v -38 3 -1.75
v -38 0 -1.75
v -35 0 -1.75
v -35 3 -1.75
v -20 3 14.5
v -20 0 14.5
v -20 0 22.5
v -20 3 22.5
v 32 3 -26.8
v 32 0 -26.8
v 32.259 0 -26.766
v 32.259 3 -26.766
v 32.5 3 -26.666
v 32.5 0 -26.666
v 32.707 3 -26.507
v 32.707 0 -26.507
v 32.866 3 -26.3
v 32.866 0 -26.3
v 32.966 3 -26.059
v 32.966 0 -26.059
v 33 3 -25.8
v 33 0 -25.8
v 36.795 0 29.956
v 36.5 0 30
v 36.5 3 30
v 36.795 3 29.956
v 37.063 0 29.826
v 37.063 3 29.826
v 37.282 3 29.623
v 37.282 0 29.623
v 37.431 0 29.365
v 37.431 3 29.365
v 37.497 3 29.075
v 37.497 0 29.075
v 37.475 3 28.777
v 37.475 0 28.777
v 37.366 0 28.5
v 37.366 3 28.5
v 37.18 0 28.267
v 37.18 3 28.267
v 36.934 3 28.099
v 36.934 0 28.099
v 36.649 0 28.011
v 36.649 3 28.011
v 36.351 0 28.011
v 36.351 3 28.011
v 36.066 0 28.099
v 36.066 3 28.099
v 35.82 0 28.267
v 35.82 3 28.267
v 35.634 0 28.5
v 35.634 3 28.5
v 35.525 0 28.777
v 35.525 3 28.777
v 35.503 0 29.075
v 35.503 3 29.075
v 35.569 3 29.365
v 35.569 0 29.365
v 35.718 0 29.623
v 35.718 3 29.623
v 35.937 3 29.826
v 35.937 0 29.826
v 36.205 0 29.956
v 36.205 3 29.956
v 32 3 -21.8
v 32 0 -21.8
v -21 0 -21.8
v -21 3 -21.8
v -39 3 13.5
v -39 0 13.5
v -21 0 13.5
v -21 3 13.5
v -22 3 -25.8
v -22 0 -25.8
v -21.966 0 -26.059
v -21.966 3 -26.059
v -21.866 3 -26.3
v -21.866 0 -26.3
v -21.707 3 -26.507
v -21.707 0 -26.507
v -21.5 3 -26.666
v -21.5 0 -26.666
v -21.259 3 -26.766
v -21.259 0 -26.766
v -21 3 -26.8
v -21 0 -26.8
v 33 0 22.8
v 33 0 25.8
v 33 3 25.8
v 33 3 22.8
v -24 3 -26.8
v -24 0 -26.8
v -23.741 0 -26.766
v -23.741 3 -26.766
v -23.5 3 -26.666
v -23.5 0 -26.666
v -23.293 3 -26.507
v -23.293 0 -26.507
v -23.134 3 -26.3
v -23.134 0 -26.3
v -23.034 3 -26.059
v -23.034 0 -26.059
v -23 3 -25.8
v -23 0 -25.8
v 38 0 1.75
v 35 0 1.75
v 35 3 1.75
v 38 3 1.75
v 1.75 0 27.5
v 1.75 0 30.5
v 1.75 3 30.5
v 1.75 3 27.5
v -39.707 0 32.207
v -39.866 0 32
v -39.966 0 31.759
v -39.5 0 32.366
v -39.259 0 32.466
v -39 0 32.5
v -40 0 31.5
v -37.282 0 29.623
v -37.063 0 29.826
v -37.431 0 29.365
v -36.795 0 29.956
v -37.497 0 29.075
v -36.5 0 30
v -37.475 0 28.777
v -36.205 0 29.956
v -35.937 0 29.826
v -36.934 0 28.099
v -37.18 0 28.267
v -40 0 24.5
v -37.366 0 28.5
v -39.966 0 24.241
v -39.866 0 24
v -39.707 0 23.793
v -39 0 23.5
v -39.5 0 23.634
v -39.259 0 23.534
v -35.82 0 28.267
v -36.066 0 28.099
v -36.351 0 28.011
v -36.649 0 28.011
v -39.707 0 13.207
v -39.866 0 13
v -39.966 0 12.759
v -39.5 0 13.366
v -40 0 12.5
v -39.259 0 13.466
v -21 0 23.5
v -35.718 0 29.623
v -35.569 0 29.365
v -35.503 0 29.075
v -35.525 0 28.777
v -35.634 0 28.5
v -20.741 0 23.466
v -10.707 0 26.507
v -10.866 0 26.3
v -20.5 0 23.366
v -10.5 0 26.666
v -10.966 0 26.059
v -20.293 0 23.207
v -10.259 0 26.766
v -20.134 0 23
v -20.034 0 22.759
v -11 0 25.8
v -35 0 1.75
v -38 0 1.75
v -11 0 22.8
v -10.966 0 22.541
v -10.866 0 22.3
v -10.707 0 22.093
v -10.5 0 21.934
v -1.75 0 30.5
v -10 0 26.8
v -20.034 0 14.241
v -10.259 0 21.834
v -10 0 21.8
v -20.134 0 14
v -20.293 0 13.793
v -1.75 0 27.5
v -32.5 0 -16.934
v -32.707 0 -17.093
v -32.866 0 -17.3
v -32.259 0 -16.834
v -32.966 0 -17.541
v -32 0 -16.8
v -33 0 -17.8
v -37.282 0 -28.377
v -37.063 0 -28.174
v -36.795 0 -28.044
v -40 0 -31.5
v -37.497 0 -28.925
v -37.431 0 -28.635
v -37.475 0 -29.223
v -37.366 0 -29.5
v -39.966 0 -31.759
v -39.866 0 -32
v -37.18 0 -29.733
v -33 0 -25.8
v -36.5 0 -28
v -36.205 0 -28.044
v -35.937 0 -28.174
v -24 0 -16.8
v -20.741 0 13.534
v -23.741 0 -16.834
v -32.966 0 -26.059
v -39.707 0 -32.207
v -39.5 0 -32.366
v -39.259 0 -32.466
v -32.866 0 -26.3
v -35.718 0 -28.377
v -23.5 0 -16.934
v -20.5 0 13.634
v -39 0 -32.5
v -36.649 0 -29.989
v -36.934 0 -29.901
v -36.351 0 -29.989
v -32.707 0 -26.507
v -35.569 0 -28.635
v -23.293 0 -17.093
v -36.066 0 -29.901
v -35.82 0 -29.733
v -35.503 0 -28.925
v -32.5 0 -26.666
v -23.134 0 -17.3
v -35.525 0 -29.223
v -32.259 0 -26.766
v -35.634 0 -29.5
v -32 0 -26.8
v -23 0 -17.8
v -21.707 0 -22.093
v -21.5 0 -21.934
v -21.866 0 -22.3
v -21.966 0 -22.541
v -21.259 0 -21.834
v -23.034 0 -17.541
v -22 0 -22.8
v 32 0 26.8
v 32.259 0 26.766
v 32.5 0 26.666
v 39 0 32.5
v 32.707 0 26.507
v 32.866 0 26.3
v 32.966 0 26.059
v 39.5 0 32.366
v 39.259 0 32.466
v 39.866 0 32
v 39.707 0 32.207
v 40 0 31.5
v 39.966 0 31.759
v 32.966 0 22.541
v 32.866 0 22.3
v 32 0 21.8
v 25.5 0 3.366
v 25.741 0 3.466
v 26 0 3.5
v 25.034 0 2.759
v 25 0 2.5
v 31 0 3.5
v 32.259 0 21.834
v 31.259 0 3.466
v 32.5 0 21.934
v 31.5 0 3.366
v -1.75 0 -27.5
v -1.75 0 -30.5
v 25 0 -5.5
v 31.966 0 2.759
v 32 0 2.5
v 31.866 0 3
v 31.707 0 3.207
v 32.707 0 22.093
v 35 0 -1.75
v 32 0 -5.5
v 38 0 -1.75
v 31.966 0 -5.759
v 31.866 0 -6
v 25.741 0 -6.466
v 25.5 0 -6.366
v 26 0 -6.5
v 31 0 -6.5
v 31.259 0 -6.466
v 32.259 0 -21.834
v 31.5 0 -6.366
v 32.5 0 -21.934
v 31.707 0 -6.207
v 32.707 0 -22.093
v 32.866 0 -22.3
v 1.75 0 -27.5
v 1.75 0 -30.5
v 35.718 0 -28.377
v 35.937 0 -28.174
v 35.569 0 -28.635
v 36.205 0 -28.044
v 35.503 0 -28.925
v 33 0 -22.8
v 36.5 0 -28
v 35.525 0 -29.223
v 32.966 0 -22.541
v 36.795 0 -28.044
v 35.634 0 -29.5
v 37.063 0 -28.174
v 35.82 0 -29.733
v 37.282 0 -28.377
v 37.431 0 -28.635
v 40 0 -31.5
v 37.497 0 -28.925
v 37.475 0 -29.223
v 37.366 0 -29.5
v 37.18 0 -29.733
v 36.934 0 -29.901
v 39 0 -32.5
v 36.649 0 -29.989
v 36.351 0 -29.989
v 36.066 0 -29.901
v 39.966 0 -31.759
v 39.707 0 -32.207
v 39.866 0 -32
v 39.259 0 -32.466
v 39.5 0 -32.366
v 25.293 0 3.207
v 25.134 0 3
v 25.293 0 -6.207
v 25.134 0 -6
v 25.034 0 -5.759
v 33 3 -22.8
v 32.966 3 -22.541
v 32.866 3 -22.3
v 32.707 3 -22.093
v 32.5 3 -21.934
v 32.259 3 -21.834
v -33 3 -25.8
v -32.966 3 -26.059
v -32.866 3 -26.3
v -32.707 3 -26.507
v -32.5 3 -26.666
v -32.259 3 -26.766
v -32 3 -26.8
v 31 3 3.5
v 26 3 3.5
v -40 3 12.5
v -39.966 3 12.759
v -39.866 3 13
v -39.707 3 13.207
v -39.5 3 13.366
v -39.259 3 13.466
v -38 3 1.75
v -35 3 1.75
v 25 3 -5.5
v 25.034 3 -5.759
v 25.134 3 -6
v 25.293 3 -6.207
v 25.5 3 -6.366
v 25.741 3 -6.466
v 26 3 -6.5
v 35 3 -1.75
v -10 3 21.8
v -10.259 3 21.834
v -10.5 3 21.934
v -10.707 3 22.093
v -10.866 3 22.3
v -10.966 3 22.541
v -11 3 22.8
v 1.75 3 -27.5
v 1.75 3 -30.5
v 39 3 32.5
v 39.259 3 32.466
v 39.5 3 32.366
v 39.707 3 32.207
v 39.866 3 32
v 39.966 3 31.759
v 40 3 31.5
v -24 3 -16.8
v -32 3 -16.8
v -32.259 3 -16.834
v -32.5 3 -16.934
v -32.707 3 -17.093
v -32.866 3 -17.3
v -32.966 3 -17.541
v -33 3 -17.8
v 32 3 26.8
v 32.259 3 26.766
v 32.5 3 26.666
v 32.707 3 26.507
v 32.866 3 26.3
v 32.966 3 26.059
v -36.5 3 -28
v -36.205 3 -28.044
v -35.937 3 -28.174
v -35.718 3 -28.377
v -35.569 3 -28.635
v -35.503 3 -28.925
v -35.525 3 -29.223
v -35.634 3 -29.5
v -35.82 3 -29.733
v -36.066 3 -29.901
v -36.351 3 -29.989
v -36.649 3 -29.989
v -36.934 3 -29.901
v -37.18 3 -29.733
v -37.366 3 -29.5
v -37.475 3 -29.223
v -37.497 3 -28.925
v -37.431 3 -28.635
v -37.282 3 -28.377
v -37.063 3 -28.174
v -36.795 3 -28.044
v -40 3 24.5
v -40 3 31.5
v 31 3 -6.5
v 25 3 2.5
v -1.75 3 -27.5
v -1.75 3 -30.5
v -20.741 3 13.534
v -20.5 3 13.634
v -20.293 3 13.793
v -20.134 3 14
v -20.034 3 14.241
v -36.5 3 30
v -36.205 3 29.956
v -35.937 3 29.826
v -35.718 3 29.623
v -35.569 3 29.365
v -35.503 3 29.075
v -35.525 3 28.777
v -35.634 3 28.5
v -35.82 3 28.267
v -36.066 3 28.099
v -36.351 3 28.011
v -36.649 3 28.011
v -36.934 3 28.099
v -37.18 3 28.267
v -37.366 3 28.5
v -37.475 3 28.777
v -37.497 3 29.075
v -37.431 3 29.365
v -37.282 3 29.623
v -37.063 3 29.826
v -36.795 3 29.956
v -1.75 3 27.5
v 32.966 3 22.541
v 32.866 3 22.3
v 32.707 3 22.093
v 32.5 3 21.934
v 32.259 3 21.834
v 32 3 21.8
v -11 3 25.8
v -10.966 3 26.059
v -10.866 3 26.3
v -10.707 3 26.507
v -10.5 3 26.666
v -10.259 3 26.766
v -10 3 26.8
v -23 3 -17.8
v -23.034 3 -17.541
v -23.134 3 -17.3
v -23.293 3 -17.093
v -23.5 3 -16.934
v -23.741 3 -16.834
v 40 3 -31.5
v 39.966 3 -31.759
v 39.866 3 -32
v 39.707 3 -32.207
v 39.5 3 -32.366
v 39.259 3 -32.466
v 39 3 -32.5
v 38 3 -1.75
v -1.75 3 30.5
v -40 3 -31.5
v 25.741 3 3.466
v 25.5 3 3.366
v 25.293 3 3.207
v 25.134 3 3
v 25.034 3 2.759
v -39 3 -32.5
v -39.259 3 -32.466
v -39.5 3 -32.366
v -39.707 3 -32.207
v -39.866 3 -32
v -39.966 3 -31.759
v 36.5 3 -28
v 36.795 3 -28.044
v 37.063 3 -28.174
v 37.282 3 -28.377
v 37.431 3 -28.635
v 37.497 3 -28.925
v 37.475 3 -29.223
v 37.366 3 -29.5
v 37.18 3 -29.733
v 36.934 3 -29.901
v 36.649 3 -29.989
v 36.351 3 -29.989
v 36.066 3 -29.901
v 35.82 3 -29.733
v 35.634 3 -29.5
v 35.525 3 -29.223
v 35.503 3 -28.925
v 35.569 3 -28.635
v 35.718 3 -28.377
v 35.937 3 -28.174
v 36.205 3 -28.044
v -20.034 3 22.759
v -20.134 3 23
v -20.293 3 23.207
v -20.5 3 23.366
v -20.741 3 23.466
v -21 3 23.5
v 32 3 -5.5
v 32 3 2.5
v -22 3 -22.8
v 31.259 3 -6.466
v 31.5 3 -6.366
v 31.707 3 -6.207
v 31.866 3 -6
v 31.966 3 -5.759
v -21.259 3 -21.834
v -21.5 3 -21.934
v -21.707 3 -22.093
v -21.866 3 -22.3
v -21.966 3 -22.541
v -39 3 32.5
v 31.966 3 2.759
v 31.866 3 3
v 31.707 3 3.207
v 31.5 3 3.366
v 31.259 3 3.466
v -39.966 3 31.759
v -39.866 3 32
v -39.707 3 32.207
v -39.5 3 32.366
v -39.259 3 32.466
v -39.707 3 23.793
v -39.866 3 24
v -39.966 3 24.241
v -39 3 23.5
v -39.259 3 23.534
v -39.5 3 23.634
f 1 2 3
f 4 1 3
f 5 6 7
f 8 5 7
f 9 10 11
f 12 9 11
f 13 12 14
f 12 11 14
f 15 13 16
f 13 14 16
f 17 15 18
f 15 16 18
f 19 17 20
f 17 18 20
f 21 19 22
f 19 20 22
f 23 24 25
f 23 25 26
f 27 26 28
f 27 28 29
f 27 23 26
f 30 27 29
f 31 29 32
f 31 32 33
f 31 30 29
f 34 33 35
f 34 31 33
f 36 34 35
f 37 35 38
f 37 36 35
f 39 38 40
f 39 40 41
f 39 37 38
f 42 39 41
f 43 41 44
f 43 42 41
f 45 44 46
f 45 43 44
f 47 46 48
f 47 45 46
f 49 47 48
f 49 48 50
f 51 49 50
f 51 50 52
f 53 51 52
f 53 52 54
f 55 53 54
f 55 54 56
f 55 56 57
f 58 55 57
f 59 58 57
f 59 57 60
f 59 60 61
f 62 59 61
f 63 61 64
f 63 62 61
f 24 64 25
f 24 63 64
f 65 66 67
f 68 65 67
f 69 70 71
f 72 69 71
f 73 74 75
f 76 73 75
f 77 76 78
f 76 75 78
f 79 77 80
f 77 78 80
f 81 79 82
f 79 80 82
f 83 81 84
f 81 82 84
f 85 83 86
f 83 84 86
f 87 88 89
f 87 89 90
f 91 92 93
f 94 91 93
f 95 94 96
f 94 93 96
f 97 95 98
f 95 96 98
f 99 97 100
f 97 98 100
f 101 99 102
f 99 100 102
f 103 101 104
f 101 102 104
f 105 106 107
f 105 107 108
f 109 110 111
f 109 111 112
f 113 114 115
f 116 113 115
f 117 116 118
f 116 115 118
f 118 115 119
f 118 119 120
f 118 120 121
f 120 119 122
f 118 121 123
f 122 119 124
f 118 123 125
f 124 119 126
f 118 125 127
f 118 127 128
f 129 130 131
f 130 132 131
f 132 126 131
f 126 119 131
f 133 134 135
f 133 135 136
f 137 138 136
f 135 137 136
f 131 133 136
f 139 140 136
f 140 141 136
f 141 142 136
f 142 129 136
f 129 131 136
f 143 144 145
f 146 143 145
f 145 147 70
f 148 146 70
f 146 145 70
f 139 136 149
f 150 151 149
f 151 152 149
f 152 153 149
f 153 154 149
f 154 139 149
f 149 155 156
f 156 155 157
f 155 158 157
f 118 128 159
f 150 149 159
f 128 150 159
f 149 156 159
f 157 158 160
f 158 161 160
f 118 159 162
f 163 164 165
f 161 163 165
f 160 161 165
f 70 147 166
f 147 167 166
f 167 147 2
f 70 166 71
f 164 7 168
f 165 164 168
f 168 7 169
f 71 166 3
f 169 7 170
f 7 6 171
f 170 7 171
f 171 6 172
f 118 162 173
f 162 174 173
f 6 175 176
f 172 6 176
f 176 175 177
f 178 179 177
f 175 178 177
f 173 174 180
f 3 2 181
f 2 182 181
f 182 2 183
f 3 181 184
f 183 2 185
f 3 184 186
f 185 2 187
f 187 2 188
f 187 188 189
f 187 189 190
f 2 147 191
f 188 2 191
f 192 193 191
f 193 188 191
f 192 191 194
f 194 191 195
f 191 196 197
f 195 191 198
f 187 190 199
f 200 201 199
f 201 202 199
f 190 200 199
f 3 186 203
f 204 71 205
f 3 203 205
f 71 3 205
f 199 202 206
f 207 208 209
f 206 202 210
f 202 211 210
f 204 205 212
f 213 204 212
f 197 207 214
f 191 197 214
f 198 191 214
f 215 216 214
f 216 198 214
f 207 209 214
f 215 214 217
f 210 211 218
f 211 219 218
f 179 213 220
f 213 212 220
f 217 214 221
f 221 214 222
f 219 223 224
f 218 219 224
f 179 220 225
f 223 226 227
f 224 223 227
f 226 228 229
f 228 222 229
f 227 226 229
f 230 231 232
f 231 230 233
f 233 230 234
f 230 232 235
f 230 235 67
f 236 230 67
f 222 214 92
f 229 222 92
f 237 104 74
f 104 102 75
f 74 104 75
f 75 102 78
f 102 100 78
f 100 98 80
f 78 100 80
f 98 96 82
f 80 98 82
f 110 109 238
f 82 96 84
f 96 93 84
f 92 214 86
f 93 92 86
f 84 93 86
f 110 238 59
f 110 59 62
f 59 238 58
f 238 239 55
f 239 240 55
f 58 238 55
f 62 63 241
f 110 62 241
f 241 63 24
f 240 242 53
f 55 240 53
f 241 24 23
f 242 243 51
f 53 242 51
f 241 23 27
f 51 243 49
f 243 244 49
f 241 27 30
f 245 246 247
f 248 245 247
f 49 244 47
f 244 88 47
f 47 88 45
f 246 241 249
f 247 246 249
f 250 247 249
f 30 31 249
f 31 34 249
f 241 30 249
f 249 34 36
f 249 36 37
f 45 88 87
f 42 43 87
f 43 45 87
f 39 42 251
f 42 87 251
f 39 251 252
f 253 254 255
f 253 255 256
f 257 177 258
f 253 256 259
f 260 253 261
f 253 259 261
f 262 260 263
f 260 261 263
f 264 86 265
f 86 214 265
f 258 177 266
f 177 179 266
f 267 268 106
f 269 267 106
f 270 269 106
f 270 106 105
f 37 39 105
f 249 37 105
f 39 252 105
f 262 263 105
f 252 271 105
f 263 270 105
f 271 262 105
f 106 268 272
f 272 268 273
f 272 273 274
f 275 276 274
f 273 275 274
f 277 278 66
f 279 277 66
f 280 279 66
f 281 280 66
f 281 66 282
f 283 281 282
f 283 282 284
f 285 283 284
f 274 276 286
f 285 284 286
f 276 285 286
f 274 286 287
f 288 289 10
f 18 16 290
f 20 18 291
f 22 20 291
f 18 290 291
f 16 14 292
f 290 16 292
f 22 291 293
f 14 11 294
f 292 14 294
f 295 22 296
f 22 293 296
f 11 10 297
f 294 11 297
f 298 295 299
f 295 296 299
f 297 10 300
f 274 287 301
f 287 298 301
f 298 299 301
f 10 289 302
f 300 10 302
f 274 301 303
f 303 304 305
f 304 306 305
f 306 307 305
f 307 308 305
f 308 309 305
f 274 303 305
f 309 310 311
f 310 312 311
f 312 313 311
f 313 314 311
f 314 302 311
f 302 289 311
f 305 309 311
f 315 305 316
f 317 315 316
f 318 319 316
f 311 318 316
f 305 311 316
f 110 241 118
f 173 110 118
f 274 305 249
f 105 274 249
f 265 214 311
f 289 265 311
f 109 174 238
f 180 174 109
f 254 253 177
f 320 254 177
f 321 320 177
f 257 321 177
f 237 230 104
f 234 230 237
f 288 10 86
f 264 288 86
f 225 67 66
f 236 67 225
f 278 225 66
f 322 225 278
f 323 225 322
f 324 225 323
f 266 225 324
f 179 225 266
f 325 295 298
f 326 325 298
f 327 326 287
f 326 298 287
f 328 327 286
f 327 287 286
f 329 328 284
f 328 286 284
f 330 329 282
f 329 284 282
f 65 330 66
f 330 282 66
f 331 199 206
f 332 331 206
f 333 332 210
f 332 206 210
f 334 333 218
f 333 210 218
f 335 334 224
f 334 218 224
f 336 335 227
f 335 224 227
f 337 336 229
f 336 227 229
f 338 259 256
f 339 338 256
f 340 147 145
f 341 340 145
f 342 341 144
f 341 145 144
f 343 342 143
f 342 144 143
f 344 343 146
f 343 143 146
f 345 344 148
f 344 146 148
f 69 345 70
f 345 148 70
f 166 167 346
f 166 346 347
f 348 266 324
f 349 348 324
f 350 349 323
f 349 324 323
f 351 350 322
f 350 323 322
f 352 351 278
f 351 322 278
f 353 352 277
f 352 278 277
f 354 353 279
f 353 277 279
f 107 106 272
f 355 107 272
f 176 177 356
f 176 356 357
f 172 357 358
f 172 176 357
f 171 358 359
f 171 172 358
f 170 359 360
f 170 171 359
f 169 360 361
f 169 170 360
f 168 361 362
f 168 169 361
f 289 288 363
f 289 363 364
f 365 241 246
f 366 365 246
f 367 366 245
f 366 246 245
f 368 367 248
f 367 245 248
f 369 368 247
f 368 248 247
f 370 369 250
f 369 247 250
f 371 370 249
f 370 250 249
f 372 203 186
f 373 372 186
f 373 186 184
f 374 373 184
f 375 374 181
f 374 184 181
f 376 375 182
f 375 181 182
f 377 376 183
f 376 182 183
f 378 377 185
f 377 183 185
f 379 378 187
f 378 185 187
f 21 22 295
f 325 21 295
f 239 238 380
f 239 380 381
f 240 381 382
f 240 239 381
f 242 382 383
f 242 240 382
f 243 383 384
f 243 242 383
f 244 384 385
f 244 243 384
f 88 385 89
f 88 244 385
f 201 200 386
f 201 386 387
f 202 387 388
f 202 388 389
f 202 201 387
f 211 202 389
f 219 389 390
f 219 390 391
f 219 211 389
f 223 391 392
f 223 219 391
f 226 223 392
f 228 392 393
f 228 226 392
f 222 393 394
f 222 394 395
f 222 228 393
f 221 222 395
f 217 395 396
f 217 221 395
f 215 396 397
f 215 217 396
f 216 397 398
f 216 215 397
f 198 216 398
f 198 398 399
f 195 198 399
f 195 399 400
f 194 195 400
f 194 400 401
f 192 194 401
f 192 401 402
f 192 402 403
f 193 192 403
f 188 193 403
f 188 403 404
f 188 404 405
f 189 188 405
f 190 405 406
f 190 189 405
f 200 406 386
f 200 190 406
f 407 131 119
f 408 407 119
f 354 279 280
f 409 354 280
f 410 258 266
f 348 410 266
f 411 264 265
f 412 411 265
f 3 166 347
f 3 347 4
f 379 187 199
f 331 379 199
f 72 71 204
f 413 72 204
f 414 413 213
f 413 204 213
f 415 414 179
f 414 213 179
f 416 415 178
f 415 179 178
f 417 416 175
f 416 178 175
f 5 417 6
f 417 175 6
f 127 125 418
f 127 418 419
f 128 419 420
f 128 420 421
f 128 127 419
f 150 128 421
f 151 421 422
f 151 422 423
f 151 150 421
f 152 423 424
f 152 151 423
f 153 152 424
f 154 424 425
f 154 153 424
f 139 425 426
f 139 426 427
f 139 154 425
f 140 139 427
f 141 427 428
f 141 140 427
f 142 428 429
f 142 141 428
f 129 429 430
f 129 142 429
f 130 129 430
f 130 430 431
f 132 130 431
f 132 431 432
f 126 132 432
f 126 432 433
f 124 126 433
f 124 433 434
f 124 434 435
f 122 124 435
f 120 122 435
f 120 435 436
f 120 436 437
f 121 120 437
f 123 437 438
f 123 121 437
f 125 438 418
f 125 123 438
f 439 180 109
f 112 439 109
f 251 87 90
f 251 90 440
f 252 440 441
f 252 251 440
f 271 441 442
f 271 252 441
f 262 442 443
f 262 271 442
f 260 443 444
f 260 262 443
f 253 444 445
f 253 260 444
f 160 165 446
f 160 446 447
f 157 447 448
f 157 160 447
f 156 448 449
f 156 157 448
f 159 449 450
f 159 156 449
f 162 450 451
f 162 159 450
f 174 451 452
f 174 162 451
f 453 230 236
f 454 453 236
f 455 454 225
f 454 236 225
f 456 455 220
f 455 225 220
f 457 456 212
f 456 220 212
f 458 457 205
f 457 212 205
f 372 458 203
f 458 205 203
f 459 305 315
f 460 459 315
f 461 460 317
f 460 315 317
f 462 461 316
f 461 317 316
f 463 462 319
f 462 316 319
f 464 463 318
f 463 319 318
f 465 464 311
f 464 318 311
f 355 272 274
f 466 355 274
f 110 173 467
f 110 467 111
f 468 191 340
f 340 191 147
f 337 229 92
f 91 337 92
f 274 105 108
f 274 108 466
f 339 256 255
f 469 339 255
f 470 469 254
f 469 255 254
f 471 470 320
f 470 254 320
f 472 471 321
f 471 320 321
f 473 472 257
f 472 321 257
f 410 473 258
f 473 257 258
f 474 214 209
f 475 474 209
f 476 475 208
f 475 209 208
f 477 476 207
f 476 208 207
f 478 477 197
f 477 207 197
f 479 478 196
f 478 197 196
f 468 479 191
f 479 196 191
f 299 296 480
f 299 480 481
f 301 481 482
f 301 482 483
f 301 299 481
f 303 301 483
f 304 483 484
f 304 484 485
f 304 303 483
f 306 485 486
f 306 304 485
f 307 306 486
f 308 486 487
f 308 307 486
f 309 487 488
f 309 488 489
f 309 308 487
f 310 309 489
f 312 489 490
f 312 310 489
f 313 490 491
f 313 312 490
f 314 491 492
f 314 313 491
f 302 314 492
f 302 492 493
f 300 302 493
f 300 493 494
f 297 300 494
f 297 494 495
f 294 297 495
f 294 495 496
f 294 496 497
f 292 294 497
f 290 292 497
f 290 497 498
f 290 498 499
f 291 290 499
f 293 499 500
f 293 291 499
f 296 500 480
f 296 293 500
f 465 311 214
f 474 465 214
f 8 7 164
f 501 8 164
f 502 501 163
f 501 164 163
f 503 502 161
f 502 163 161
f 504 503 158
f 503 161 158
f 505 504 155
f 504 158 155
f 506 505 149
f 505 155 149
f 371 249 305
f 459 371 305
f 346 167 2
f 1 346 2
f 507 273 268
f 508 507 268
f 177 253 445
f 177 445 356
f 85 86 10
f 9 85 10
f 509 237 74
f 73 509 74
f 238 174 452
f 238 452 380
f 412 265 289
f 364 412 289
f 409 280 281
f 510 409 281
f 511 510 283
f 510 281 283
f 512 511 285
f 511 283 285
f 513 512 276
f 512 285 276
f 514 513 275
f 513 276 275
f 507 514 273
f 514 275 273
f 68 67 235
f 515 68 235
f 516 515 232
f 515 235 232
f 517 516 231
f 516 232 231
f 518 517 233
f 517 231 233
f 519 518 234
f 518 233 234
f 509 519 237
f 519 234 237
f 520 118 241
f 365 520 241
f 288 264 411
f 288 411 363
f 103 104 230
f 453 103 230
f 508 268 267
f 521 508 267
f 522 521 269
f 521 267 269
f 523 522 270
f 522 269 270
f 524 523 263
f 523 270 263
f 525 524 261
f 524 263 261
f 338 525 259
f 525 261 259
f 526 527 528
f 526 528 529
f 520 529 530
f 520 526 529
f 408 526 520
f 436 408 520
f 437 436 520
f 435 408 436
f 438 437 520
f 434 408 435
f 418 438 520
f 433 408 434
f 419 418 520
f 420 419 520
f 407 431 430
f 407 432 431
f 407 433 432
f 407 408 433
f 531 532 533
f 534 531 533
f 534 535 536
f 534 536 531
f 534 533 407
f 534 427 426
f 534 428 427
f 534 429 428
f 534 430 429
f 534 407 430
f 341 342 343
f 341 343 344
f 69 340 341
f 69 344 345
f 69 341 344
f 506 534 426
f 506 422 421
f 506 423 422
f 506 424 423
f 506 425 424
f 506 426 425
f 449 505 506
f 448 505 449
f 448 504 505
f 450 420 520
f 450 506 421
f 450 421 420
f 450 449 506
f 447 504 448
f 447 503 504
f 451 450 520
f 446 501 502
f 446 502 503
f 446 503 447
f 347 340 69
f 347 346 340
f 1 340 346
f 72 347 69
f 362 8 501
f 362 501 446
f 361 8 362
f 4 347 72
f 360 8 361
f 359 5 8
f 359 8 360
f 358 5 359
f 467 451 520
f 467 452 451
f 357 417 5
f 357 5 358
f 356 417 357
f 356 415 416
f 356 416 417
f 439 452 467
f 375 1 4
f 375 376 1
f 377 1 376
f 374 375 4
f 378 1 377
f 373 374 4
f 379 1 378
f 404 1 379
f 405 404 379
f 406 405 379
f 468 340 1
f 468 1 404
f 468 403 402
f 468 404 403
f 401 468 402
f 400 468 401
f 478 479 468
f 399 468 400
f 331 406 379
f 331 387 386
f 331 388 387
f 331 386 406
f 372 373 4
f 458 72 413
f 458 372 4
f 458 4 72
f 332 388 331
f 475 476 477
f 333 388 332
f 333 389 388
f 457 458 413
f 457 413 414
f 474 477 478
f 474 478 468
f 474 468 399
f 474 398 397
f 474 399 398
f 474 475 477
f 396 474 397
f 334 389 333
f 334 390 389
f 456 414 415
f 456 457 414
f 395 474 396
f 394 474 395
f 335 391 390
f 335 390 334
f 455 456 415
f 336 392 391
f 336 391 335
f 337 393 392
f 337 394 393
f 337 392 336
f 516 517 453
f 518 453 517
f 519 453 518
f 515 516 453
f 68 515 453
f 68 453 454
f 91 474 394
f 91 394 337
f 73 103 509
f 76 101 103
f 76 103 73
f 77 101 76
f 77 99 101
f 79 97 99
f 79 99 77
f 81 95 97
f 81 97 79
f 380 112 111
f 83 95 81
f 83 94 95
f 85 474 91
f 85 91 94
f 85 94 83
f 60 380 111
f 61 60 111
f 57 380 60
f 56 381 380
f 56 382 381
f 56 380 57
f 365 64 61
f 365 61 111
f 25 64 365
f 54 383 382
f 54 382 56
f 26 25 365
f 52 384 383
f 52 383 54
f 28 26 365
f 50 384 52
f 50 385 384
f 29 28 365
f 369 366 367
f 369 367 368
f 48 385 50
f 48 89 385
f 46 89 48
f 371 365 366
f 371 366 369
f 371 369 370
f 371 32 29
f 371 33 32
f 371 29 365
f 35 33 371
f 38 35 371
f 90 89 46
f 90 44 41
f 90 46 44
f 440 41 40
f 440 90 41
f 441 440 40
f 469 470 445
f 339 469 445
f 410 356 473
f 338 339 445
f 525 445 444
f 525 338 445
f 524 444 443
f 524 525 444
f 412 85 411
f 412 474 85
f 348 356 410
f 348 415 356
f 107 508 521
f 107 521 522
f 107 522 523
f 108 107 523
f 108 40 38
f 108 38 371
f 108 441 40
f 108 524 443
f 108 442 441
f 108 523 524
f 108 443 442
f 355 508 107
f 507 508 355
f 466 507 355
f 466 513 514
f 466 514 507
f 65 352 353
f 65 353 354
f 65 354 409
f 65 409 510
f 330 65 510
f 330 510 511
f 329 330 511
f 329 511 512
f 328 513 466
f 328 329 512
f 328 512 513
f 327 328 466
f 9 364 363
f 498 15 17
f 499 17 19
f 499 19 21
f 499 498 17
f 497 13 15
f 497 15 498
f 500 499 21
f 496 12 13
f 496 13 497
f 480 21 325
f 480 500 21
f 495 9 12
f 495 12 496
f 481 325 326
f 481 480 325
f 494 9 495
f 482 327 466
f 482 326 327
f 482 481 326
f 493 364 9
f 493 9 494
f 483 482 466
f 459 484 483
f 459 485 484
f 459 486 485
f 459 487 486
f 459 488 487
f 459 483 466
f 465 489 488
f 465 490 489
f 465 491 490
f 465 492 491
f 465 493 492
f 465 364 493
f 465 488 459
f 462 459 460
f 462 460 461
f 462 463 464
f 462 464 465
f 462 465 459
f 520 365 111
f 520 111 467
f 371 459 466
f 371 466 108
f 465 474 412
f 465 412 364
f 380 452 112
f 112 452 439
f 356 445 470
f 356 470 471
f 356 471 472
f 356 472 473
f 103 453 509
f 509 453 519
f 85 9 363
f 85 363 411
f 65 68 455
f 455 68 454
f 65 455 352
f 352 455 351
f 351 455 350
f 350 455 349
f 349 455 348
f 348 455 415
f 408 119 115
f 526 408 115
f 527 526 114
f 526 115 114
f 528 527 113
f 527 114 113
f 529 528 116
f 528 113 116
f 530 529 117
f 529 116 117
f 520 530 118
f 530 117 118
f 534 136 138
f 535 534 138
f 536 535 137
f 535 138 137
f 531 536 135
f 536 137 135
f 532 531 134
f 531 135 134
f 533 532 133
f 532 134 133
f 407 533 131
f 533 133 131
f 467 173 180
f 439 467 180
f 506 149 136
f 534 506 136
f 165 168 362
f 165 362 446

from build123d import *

# Parameters (mm, degrees)
CROQUIS1_R              = 1
CROQUIS1_W              = 3
CROQUIS1_H              = 3.5
CROQUIS1_W_2            = 3.5
CROQUIS1_H_2            = 3
SALIENTE_EXTRUIR1_DEPTH = 3


with BuildPart() as part:
    # Croquis1 → Saliente-Extruir1 (new body)
    with BuildSketch(Plane(origin=(0, 0, 0), x_dir=(1, 0, 0), z_dir=(0, 1, 0))):
        with BuildLine():
            Line((-39, -32.5), (39, -32.5))
            ThreePointArc((39, -32.5), (39.707106781, -32.207106781), (40, -31.5))
            Line((40, -31.5), (40, 31.5))
            ThreePointArc((40, 31.5), (39.707106781, 32.207106781), (39, 32.5))
            Line((39, 32.5), (-39, 32.5))
            ThreePointArc((-39, 32.5), (-39.707106781, 32.207106781), (-40, 31.5))
            Line((-40, 31.5), (-40, -12.5))
            ThreePointArc((-40, -12.5), (-39.707106781, -13.207106781), (-39, -13.5))
            Line((-39, -13.5), (-21, -13.5))
            ThreePointArc((-21, -13.5), (-20.292893219, -13.792893219), (-20, -14.5))
            Line((-20, -14.5), (-20, -22.5))
            ThreePointArc((-20, -22.5), (-20.292893219, -23.207106781), (-21, -23.5))
            Line((-21, -23.5), (-39, -23.5))
            ThreePointArc((-39, -23.5), (-39.707106781, -23.792893219), (-40, -24.5))
            Line((-40, -24.5), (-40, -31.5))
            ThreePointArc((-40, -31.5), (-39.707106781, -32.207106781), (-39, -32.5))
        make_face()
        with Locations(Location((-36.5, 29, 0), (0, 0, 270))):
            Circle(CROQUIS1_R, mode=Mode.SUBTRACT)
        with Locations(Location((-36.5, -29, 0), (0, 0, 270))):
            Circle(CROQUIS1_R, mode=Mode.SUBTRACT)
        with Locations(Location((36.5, 29, 0), (0, 0, 270))):
            Circle(CROQUIS1_R, mode=Mode.SUBTRACT)
        with Locations(Location((36.5, -29, 0), (0, 0, 270))):
            Circle(CROQUIS1_R, mode=Mode.SUBTRACT)
        with Locations((-36.5, 0)):
            Rectangle(CROQUIS1_W, CROQUIS1_H, mode=Mode.SUBTRACT)
        with Locations((36.5, 0)):
            Rectangle(CROQUIS1_W, CROQUIS1_H, mode=Mode.SUBTRACT)
        with Locations((0, -29)):
            Rectangle(CROQUIS1_W_2, CROQUIS1_H_2, mode=Mode.SUBTRACT)
        with Locations((0, 29)):
            Rectangle(CROQUIS1_W_2, CROQUIS1_H_2, mode=Mode.SUBTRACT)
        with BuildLine():
            Line((-10, -26.8), (32, -26.8))
            ThreePointArc((32, -26.8), (32.707106781, -26.507106781), (33, -25.8))
            Line((33, -25.8), (33, -22.8))
            ThreePointArc((33, -22.8), (32.707106781, -22.092893219), (32, -21.8))
            Line((32, -21.8), (-10, -21.8))
            ThreePointArc((-10, -21.8), (-10.707106781, -22.092893219), (-11, -22.8))
            Line((-11, -22.8), (-11, -25.8))
            ThreePointArc((-11, -25.8), (-10.707106781, -26.507106781), (-10, -26.8))
        make_face(mode=Mode.SUBTRACT)
        with BuildLine():
            Line((26, 6.5), (31, 6.5))
            ThreePointArc((31, 6.5), (31.707106781, 6.207106781), (32, 5.5))
            Line((32, 5.5), (32, -2.5))
            ThreePointArc((32, -2.5), (31.707106781, -3.207106781), (31, -3.5))
            Line((31, -3.5), (26, -3.5))
            ThreePointArc((26, -3.5), (25.292893219, -3.207106781), (25, -2.5))
            Line((25, -2.5), (25, 5.5))
            ThreePointArc((25, 5.5), (25.292893219, 6.207106781), (26, 6.5))
        make_face(mode=Mode.SUBTRACT)
        with BuildLine():
            Line((-21, 26.8), (32, 26.8))
            ThreePointArc((32, 26.8), (32.707106781, 26.507106781), (33, 25.8))
            Line((33, 25.8), (33, 22.8))
            ThreePointArc((33, 22.8), (32.707106781, 22.092893219), (32, 21.8))
            Line((32, 21.8), (-21, 21.8))
            ThreePointArc((-21, 21.8), (-21.707106781, 22.092893219), (-22, 22.8))
            Line((-22, 22.8), (-22, 25.8))
            ThreePointArc((-22, 25.8), (-21.707106781, 26.507106781), (-21, 26.8))
        make_face(mode=Mode.SUBTRACT)
        with BuildLine():
            Line((-32, 26.8), (-24, 26.8))
            ThreePointArc((-24, 26.8), (-23.292893219, 26.507106781), (-23, 25.8))
            Line((-23, 25.8), (-23, 17.8))
            ThreePointArc((-23, 17.8), (-23.292893219, 17.092893219), (-24, 16.8))
            Line((-24, 16.8), (-32, 16.8))
            ThreePointArc((-32, 16.8), (-32.707106781, 17.092893219), (-33, 17.8))
            Line((-33, 17.8), (-33, 25.8))
            ThreePointArc((-33, 25.8), (-32.707106781, 26.507106781), (-32, 26.8))
        make_face(mode=Mode.SUBTRACT)
    extrude(amount=SALIENTE_EXTRUIR1_DEPTH)


solid = part.part
